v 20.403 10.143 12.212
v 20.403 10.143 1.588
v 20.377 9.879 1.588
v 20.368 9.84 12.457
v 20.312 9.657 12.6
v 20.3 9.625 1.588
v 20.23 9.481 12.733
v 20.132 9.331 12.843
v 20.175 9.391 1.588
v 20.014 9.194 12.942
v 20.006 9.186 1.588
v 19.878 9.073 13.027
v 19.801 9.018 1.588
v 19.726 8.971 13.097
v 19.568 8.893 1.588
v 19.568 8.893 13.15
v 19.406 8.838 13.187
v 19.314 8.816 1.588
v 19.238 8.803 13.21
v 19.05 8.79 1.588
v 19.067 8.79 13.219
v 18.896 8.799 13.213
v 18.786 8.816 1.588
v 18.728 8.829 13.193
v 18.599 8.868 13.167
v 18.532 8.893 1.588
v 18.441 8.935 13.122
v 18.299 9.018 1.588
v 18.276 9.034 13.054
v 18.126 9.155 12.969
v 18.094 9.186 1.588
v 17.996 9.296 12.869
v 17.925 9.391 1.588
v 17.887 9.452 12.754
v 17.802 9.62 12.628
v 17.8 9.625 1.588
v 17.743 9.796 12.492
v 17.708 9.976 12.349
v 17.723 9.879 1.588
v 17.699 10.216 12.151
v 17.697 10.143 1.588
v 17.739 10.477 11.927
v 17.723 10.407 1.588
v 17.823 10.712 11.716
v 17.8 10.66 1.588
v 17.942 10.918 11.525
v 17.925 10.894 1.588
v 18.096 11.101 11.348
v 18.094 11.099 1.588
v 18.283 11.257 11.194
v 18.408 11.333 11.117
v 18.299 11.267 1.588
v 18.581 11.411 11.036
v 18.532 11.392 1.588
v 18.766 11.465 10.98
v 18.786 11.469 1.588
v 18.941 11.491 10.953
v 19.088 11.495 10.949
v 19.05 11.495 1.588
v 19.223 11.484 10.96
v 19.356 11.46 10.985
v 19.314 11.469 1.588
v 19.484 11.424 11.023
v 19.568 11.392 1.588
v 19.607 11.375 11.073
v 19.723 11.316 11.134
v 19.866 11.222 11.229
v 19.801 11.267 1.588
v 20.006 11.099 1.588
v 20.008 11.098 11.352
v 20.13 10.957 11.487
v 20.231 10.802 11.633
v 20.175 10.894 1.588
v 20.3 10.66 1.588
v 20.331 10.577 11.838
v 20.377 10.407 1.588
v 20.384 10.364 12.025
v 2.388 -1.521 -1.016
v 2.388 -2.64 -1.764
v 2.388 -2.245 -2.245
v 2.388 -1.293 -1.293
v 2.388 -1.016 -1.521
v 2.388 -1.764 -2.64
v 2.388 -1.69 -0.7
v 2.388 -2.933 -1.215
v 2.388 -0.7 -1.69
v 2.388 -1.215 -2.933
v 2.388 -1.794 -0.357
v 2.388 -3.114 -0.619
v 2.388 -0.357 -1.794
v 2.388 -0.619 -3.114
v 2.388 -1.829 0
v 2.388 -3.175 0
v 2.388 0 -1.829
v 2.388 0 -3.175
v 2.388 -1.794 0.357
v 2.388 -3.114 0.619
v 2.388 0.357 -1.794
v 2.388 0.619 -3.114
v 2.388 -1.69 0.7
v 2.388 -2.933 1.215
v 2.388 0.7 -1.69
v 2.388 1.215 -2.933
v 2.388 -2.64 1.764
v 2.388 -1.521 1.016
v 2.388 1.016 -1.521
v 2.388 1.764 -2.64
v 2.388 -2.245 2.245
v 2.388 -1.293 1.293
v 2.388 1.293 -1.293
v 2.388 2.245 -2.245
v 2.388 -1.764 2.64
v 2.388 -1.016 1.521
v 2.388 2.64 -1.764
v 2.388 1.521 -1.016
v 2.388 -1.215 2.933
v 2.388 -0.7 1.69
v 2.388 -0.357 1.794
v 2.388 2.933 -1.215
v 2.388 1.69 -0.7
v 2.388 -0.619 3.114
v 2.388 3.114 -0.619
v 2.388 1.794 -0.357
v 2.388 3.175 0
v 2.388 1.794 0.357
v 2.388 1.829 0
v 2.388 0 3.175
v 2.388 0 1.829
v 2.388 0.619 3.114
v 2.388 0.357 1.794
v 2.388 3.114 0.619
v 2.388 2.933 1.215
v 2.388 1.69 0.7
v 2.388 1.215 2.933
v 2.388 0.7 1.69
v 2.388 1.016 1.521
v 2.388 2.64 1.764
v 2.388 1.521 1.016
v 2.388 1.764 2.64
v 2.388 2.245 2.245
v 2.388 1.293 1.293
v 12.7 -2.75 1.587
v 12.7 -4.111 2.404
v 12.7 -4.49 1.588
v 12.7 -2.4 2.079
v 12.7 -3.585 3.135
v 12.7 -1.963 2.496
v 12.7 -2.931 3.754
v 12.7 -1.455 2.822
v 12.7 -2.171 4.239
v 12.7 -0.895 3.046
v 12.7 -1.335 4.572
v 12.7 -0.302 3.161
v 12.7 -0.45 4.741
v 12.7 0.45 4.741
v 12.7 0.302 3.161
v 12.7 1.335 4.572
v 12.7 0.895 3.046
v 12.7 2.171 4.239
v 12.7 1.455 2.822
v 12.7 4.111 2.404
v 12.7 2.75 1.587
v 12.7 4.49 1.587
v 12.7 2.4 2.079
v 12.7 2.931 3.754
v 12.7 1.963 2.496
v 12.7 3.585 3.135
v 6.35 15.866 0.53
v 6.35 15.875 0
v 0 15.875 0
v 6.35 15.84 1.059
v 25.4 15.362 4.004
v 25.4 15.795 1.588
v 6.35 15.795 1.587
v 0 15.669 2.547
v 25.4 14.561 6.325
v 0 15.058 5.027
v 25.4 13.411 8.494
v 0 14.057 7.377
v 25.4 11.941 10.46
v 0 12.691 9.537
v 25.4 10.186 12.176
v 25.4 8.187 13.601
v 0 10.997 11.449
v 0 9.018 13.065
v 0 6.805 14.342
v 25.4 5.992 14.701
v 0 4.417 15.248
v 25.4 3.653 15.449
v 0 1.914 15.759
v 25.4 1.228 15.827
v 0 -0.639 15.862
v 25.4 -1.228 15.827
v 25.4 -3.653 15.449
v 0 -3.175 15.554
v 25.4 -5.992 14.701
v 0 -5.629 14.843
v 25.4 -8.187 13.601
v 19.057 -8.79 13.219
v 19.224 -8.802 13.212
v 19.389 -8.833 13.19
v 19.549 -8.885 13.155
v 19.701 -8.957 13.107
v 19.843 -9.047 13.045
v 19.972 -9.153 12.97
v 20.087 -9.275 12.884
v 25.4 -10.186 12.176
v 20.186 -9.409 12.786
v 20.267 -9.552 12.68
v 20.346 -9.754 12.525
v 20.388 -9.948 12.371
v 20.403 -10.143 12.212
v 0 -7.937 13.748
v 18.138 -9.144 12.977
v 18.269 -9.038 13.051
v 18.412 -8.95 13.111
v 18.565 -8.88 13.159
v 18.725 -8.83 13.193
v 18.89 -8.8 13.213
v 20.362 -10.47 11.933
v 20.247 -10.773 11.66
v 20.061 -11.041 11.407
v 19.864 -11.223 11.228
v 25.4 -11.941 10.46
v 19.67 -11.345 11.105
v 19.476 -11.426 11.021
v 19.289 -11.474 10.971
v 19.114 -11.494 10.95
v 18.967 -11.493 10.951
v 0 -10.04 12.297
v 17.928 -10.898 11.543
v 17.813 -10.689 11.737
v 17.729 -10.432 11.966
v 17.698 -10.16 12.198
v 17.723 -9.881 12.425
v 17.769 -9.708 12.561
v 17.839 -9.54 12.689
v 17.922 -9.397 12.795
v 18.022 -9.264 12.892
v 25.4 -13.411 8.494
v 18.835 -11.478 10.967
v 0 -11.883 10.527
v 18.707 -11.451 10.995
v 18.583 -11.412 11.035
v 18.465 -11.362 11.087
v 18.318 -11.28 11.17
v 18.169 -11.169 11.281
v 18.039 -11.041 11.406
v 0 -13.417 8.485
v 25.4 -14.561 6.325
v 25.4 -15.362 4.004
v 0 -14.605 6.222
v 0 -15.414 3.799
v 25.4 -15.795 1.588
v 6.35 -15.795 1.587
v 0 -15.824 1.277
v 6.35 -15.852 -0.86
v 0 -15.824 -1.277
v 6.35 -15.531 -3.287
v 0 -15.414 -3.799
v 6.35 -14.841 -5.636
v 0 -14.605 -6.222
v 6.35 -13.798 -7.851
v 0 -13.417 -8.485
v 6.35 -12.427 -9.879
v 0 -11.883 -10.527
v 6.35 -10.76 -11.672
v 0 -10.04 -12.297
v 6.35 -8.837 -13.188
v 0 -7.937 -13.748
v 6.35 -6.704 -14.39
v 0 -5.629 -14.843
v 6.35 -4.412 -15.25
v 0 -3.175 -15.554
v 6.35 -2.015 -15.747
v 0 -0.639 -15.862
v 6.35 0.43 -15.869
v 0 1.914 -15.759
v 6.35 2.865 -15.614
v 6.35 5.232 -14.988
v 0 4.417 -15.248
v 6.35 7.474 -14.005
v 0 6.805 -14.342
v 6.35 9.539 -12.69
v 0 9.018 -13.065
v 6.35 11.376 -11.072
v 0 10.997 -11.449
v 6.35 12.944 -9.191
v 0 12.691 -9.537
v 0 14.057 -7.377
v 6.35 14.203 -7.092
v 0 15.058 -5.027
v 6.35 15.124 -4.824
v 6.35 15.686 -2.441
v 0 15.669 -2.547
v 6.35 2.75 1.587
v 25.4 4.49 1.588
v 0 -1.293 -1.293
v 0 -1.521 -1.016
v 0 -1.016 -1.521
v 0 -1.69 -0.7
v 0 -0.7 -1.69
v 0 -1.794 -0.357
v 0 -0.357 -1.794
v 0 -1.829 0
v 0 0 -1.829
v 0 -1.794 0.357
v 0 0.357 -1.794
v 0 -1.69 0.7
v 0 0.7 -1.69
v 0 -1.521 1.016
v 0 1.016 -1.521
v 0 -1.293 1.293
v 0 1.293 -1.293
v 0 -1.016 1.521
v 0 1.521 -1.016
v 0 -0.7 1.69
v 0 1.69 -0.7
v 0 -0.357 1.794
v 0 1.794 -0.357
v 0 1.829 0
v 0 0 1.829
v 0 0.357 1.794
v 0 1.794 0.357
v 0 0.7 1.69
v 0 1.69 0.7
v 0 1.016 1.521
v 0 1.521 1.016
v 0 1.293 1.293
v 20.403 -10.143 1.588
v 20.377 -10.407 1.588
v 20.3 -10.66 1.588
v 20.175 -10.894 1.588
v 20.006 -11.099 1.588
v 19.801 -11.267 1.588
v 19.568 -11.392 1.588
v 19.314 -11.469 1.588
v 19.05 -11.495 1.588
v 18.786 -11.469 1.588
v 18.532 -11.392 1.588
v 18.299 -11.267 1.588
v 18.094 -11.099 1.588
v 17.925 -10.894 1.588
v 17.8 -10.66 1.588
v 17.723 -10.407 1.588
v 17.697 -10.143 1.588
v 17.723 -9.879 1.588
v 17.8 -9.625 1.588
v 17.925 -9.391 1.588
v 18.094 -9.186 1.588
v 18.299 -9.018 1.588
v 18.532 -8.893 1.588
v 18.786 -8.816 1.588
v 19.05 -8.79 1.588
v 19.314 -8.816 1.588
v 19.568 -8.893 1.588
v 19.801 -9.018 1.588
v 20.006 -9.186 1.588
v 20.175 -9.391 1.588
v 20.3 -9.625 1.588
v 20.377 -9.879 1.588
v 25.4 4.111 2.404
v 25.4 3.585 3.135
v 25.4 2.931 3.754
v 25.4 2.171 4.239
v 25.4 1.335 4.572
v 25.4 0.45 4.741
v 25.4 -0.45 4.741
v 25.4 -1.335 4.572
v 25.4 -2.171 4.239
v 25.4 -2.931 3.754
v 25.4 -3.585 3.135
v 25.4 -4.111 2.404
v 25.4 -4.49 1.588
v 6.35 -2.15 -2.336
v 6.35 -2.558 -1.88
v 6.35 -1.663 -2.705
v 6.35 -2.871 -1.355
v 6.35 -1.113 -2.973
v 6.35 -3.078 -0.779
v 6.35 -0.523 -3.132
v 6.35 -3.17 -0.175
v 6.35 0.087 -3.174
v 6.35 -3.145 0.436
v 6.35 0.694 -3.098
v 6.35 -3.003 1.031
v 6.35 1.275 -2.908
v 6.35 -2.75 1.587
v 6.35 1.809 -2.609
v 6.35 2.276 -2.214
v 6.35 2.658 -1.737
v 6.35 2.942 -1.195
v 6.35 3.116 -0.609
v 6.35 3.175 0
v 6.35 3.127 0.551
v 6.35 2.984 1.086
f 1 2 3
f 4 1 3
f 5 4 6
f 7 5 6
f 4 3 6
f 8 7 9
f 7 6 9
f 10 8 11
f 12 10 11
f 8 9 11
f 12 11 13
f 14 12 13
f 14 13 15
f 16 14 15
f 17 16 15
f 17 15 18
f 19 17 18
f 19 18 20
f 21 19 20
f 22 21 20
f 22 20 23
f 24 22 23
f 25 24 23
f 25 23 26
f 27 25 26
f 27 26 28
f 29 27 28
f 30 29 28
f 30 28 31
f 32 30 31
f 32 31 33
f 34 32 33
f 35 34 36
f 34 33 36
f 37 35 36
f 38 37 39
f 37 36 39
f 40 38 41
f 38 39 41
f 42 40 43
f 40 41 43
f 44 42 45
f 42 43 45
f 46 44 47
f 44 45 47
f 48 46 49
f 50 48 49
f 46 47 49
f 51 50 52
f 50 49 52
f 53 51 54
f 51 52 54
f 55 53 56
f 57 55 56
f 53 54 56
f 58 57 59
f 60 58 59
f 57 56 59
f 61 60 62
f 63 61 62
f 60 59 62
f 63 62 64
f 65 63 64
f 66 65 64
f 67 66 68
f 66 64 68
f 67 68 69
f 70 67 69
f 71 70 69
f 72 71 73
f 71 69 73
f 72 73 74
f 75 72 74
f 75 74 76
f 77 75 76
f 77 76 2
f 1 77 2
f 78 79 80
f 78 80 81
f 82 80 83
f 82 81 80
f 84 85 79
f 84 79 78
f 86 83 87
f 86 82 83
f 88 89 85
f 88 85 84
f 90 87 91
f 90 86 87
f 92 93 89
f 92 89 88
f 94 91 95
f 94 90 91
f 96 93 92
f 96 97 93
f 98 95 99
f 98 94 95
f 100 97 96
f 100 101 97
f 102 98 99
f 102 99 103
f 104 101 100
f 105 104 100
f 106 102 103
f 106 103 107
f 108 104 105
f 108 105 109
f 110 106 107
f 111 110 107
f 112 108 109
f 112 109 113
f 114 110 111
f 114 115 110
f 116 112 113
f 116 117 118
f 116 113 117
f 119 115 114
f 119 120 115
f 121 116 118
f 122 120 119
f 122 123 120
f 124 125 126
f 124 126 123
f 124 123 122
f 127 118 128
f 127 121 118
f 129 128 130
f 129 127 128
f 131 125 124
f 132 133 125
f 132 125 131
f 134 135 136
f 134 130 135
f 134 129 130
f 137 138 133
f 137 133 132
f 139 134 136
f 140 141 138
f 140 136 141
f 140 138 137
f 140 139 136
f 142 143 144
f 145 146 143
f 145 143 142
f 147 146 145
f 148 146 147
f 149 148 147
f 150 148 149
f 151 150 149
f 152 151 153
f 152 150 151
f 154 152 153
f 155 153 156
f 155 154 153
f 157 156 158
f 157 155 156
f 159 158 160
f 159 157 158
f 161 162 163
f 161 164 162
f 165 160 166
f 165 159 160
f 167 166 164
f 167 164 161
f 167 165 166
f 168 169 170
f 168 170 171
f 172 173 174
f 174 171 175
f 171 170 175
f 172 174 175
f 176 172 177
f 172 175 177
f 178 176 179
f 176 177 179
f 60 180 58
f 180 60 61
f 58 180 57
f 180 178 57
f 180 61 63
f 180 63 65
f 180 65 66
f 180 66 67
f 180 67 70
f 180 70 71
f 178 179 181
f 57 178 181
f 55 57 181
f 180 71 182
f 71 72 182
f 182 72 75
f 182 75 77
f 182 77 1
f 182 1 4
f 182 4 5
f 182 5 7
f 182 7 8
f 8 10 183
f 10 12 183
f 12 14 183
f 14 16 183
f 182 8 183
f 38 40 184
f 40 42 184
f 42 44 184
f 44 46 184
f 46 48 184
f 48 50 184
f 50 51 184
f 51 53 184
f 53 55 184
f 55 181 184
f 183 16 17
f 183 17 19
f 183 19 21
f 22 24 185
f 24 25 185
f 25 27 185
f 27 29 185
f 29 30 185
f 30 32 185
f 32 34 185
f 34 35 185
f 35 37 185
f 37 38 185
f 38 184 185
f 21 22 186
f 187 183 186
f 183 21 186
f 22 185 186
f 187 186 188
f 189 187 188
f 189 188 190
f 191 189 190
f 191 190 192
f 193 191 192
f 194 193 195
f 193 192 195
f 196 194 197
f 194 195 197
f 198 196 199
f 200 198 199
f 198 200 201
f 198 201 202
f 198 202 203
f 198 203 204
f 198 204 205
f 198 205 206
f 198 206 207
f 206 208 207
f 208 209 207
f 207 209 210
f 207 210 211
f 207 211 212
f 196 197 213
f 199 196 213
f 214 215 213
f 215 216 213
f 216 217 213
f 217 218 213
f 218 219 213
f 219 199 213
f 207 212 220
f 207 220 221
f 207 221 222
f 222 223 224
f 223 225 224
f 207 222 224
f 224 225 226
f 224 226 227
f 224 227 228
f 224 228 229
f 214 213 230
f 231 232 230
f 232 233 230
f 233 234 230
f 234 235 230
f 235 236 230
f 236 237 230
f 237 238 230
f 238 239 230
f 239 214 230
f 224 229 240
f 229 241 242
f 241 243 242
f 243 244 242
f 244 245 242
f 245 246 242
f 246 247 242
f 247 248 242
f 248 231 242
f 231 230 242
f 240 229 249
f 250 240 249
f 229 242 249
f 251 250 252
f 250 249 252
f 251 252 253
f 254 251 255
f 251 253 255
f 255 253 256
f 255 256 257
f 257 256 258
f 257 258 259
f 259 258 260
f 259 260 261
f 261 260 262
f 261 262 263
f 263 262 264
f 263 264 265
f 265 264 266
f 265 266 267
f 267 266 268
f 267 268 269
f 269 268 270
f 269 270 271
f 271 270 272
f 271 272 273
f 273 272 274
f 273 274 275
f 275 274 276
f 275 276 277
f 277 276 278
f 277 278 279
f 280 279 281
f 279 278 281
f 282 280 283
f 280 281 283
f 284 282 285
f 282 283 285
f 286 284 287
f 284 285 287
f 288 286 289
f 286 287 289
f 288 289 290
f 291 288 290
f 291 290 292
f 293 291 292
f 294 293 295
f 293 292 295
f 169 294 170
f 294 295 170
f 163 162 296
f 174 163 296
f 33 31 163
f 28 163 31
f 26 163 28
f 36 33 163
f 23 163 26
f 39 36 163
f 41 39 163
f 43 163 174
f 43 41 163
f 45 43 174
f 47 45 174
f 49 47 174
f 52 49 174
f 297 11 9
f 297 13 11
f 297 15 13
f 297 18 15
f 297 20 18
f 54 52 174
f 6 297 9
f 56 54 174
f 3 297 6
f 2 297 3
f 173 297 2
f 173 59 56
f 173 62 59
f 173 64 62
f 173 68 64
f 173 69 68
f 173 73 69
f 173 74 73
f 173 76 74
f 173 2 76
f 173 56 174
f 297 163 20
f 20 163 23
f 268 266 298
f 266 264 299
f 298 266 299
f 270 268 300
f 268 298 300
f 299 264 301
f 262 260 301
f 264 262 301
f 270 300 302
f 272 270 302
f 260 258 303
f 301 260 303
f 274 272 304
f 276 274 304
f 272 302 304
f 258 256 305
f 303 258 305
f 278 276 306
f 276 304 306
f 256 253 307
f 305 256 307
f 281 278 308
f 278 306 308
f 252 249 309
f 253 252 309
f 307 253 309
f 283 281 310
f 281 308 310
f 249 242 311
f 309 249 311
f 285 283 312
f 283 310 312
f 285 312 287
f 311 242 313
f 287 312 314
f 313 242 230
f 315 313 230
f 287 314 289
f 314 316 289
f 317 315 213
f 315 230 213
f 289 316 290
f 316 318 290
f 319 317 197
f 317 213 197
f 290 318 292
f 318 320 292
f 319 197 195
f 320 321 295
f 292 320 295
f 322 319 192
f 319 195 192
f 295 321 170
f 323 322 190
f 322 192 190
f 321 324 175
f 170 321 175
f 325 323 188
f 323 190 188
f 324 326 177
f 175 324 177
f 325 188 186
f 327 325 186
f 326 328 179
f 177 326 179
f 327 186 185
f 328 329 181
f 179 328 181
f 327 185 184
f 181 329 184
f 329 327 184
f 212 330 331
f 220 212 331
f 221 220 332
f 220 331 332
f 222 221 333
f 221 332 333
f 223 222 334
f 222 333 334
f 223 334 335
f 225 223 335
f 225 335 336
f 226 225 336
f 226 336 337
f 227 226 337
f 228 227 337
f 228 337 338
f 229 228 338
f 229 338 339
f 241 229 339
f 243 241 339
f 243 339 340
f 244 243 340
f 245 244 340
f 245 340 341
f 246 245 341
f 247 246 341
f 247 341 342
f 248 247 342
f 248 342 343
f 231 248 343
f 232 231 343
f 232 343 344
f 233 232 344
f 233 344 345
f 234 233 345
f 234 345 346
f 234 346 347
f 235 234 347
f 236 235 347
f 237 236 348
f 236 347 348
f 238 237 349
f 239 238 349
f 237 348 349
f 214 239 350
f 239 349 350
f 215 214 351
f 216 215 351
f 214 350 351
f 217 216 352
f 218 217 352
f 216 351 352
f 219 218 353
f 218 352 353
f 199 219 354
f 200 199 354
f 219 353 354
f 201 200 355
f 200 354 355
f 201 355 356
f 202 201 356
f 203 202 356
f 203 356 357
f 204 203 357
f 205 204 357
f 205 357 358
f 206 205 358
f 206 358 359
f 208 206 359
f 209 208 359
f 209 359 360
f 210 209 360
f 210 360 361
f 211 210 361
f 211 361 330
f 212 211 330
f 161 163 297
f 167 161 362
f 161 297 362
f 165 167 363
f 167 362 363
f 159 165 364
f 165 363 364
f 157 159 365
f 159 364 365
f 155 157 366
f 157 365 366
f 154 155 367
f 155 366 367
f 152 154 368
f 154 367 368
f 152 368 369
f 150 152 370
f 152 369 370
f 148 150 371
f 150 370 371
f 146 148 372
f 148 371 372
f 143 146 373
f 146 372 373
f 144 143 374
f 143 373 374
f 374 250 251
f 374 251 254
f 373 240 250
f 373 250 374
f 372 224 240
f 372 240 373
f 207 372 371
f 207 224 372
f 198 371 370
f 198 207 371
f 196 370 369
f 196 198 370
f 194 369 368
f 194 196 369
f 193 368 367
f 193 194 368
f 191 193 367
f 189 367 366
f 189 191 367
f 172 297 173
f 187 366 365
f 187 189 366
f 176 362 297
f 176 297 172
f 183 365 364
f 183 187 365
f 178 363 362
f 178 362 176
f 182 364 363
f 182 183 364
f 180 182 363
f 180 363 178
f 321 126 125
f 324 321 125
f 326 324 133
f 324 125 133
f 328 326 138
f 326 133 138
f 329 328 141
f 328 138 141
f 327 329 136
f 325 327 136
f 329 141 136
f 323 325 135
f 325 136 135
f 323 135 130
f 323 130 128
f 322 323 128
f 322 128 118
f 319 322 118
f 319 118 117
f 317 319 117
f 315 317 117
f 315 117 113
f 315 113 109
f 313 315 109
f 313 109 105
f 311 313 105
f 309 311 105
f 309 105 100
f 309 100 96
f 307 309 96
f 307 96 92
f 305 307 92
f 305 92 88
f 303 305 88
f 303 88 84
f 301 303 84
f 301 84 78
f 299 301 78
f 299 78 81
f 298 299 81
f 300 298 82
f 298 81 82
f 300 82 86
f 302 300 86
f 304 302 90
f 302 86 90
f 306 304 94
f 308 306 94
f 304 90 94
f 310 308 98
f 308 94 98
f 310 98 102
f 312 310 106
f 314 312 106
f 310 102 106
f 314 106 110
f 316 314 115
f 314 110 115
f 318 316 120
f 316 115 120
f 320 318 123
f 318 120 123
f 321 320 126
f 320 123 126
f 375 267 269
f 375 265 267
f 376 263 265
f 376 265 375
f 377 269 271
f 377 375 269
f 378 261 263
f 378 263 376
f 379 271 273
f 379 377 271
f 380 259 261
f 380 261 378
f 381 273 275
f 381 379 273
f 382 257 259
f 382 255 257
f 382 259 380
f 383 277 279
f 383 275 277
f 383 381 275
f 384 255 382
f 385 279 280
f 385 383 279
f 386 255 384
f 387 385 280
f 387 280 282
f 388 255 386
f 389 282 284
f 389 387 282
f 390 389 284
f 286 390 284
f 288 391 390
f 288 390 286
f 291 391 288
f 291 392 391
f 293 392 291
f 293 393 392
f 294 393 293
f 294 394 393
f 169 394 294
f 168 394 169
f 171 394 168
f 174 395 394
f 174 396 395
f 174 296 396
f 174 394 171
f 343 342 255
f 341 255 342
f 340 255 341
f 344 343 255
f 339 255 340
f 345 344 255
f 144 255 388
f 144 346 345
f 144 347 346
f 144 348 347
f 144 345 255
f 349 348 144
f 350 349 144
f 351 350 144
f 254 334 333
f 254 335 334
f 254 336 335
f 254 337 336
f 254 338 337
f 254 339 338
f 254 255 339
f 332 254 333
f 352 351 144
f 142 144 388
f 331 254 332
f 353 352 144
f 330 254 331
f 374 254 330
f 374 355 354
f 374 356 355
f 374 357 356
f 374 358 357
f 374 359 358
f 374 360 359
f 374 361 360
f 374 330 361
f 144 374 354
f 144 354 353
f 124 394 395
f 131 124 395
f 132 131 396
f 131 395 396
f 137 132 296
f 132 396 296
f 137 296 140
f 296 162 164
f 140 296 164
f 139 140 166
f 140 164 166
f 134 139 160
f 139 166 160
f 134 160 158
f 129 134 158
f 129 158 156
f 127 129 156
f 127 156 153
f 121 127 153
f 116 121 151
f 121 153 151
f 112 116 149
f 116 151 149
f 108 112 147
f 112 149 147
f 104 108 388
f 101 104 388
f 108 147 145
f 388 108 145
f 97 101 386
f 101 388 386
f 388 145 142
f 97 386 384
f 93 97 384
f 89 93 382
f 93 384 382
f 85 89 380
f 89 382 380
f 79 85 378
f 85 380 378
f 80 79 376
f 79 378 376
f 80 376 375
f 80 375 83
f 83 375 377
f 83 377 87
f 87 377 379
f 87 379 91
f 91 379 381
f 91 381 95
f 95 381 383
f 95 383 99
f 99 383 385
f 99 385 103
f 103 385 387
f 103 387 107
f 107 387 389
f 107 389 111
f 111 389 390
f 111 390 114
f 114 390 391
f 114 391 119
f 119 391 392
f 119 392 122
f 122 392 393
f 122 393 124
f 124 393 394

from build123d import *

# Parameters (mm, degrees)
F0_R      = 15.875
F1_DEPTH  = 25.4
F2_W      = 49.386511
F2_H      = 19.034712
F3_DEPTH  = 19.05
F4_R      = 1.8288
F5_DEPTH  = 6.351
F6_R      = 4.7625
F7_DEPTH  = 12.7
F8_R      = 3.175
F9_DEPTH  = 23.0124
F10_R     = 1.35255
F11_DEPTH = 14.2885


with BuildPart() as f1:
    # F0 (on Right) → F1 (new body)
    with BuildSketch(Plane.YZ):
        Circle(F0_R)
    extrude(amount=F1_DEPTH)

    # F2 (on face) → F3 (cut)
    with BuildSketch(Plane.YZ.offset(25.4)):
        with Locations((-1.538695, -7.929856)):
            Rectangle(F2_W, F2_H)
    extrude(amount=-F3_DEPTH, mode=Mode.SUBTRACT)

    # F4 (on face) → F5 (cut, through all)
    with BuildSketch(Plane.YZ.offset(6.35)):
        Circle(F4_R)
    extrude(amount=-F5_DEPTH, mode=Mode.SUBTRACT)

    # F6 (on face) → F7 (cut)
    with BuildSketch(Plane.YZ.offset(25.4)):
        Circle(F6_R)
    extrude(amount=-F7_DEPTH, mode=Mode.SUBTRACT)

    # F8 (on face) → F9 (cut)
    with BuildSketch(Plane.YZ.offset(25.4)):
        Circle(F8_R)
    extrude(amount=-F9_DEPTH, mode=Mode.SUBTRACT)

    # F10 (on face) → F11 (cut, through all)
    with BuildSketch(Plane(origin=(0, 0, 1.5875), x_dir=(1, 0, 0), z_dir=(0, 0, -1))):
        with Locations((19.05, 10.142777)):
            Circle(F10_R)
        with Locations((19.05, -10.142777)):
            Circle(F10_R)
    extrude(amount=-F11_DEPTH, mode=Mode.SUBTRACT)


solid = f1.part
